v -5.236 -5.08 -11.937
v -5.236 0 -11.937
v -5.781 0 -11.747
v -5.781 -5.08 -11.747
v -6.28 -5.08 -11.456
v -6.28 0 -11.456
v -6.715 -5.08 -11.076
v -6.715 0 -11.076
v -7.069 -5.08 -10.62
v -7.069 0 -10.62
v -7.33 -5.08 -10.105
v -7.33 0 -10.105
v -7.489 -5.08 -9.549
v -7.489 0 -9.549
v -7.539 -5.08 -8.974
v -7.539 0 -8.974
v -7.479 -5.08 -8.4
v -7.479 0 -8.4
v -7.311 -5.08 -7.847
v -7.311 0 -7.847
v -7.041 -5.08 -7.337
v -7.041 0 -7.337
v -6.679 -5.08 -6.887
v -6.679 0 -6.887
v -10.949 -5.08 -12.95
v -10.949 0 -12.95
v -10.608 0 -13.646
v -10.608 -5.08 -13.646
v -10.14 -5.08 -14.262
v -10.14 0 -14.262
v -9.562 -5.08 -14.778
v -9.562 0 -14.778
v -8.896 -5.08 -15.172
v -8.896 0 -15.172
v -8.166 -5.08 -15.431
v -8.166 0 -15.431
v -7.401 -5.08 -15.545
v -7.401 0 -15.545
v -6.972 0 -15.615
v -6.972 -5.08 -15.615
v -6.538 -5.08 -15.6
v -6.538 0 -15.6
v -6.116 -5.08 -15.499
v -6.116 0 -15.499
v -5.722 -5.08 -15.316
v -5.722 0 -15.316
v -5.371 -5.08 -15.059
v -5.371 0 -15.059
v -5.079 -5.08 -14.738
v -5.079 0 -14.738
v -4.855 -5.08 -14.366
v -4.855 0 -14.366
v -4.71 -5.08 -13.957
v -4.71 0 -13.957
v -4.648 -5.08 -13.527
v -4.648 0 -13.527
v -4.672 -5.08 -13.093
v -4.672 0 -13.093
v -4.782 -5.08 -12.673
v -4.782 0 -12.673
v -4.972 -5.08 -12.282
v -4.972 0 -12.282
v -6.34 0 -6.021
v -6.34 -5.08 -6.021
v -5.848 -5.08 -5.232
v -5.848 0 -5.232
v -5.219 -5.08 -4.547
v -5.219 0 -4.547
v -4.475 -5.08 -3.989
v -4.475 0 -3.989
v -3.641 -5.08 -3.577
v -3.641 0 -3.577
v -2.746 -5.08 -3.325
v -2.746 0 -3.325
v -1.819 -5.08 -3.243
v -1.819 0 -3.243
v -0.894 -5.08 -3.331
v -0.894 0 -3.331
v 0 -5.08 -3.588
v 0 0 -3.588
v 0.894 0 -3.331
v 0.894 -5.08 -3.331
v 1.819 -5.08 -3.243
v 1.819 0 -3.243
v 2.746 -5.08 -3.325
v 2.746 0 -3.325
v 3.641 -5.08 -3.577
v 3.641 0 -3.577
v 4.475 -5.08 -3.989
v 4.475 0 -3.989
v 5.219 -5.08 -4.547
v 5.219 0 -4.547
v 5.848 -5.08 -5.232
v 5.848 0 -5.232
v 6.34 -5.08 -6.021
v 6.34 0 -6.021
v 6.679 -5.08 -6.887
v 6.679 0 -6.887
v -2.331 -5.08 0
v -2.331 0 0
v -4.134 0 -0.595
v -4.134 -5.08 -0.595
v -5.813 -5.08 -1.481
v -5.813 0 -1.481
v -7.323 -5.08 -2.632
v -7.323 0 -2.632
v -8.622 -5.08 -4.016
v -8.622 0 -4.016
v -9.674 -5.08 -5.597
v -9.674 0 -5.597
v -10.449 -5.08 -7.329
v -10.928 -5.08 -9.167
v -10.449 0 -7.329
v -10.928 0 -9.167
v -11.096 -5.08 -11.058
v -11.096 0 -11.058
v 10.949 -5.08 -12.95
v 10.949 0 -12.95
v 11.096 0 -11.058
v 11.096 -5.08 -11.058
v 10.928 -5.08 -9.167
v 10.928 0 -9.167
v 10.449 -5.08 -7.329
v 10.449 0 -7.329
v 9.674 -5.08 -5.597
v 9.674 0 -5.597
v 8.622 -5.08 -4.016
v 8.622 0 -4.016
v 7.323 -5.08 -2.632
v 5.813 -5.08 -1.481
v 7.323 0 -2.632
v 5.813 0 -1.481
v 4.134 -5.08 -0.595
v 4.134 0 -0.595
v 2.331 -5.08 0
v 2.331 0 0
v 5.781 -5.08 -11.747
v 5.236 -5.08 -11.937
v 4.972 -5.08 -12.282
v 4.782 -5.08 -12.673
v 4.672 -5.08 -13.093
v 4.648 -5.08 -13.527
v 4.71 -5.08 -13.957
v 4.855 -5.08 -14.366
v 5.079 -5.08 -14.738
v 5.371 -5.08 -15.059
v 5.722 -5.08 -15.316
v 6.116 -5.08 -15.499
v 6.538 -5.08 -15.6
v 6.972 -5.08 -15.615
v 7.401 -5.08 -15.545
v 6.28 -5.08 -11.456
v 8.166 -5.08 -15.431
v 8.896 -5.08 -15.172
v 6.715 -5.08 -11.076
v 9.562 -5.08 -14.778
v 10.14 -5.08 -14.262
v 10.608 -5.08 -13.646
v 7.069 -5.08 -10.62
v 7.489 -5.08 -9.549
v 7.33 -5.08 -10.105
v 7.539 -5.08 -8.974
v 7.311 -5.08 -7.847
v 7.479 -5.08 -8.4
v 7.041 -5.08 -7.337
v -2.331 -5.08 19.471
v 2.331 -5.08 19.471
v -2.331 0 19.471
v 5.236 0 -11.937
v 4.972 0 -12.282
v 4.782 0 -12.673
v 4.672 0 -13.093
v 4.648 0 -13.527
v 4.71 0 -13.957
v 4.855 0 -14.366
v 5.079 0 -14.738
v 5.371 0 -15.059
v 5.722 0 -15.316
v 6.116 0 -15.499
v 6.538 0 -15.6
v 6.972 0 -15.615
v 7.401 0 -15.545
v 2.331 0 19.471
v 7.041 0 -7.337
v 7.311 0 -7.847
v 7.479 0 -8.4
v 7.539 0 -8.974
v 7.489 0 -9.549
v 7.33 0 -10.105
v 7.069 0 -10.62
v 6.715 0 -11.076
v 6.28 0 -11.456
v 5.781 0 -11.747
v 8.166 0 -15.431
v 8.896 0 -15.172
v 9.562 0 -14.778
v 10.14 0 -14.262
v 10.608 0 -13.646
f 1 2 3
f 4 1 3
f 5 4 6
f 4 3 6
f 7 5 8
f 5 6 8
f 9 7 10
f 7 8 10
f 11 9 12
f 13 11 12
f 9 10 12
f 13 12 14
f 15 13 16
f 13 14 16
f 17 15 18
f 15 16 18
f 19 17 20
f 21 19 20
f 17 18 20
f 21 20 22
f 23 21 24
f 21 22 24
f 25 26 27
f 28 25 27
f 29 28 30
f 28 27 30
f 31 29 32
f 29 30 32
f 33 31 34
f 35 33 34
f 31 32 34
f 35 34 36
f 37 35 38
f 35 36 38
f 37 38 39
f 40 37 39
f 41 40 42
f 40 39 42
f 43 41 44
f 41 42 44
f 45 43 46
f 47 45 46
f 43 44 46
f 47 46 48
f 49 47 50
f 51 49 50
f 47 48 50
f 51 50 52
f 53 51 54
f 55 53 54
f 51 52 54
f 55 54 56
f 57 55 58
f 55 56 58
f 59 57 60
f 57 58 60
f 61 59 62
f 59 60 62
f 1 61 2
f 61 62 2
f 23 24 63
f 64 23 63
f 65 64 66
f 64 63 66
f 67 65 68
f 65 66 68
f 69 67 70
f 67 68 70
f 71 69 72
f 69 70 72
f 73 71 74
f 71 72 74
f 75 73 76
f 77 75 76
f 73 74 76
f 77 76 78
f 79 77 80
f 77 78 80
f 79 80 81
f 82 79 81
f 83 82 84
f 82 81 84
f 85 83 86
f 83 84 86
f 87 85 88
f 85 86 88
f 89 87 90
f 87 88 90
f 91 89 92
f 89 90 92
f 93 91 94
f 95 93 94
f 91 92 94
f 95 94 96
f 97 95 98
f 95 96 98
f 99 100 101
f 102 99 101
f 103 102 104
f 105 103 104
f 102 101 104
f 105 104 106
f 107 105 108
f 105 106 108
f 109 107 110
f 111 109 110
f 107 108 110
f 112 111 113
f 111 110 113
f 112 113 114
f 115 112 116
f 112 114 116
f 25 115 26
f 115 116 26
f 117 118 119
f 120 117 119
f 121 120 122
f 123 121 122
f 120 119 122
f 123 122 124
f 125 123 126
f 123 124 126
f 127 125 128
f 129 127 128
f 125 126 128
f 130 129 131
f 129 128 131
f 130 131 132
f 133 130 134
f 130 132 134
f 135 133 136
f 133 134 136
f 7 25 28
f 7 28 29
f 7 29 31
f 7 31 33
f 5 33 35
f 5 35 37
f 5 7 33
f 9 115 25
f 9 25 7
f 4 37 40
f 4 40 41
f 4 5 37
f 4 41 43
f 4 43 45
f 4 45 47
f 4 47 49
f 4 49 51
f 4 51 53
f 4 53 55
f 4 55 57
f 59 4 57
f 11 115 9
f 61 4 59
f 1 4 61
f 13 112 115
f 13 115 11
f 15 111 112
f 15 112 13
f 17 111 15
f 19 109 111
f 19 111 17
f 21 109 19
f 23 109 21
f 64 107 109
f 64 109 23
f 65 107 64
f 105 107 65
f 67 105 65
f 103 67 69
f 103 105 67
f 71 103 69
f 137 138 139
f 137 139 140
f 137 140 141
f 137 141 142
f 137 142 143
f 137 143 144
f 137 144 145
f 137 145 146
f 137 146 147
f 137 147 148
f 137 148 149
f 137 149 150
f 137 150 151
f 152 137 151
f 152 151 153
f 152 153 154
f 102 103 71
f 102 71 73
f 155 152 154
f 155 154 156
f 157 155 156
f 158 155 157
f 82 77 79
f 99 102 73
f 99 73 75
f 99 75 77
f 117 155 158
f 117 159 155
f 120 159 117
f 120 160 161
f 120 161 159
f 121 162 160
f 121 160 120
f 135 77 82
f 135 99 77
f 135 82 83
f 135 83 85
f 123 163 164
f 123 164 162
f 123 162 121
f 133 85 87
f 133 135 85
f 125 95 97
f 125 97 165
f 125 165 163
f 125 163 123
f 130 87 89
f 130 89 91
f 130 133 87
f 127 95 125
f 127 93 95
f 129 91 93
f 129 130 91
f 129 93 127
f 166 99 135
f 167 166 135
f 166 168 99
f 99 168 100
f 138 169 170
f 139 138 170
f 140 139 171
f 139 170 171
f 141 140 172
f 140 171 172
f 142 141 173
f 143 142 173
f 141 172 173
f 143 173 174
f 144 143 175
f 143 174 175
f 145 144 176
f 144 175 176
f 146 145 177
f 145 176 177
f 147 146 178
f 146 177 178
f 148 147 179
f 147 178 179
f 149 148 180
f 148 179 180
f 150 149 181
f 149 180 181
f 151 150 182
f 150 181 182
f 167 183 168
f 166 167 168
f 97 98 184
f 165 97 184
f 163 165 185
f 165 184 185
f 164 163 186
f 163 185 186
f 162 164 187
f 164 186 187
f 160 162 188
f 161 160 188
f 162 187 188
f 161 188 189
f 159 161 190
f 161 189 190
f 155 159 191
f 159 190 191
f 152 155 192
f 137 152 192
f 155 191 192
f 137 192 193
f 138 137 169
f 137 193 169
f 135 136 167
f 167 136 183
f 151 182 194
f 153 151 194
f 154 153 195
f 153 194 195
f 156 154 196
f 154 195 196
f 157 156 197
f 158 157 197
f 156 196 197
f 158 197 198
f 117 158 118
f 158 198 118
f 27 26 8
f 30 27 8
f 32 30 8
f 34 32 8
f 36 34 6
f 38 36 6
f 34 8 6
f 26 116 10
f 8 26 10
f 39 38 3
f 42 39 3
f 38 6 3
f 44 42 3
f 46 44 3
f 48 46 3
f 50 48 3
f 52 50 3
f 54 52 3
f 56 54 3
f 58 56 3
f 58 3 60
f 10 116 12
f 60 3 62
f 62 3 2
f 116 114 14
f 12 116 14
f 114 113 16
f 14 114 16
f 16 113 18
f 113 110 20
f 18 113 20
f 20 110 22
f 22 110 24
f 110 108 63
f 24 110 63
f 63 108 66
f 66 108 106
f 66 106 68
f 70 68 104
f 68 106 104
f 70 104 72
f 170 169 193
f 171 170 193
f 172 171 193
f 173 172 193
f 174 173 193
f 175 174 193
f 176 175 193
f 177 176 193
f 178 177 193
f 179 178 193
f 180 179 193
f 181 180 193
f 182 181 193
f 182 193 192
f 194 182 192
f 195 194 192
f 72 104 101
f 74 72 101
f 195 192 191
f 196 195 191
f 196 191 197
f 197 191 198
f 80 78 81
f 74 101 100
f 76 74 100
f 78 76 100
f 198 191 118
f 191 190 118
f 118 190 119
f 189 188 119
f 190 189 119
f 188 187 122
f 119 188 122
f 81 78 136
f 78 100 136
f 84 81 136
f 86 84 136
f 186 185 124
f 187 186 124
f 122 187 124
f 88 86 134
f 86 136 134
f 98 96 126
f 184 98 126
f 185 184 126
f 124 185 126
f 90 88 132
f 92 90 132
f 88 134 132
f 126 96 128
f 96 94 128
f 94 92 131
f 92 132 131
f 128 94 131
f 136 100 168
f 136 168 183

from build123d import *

# Parameters (mm, degrees)
F1_DEPTH = 5.08


with BuildPart() as f1:
    # F0 (on Front) → F1 (new body)
    with BuildSketch(Plane.XZ):
        with BuildLine():
            Line((-2.331354, 19.470736), (-2.331354, 0))
            ThreePointArc((-2.331354, 0), (-9.180507, -4.784652), (-10.948811, -12.950245))
            ThreePointArc((-10.948811, -12.950245), (-9.562296, -14.777595), (-7.400639, -15.544976))
            ThreePointArc((-7.400639, -15.544976), (-4.957759, -14.557545), (-5.236087, -11.937389))
            ThreePointArc((-5.236087, -11.937389), (-7.423099, -9.830791), (-6.679121, -6.886768))
            ThreePointArc((-6.679121, -6.886768), (-4.067414, -3.763698), (0, -3.588403))
            ThreePointArc((0, -3.588403), (4.067414, -3.763698), (6.679121, -6.886768))
            ThreePointArc((6.679121, -6.886768), (7.423099, -9.830791), (5.236087, -11.937389))
            ThreePointArc((5.236087, -11.937389), (4.957759, -14.557545), (7.400639, -15.544976))
            ThreePointArc((7.400639, -15.544976), (9.562296, -14.777595), (10.948811, -12.950245))
            ThreePointArc((10.948811, -12.950245), (9.180507, -4.784652), (2.331354, 0))
            Line((2.331354, 0), (2.331354, 19.470736))
            Line((2.331354, 19.470736), (0, 19.470736))
            Line((0, 19.470736), (-2.331354, 19.470736))
        make_face()
    extrude(amount=F1_DEPTH)


solid = f1.part
